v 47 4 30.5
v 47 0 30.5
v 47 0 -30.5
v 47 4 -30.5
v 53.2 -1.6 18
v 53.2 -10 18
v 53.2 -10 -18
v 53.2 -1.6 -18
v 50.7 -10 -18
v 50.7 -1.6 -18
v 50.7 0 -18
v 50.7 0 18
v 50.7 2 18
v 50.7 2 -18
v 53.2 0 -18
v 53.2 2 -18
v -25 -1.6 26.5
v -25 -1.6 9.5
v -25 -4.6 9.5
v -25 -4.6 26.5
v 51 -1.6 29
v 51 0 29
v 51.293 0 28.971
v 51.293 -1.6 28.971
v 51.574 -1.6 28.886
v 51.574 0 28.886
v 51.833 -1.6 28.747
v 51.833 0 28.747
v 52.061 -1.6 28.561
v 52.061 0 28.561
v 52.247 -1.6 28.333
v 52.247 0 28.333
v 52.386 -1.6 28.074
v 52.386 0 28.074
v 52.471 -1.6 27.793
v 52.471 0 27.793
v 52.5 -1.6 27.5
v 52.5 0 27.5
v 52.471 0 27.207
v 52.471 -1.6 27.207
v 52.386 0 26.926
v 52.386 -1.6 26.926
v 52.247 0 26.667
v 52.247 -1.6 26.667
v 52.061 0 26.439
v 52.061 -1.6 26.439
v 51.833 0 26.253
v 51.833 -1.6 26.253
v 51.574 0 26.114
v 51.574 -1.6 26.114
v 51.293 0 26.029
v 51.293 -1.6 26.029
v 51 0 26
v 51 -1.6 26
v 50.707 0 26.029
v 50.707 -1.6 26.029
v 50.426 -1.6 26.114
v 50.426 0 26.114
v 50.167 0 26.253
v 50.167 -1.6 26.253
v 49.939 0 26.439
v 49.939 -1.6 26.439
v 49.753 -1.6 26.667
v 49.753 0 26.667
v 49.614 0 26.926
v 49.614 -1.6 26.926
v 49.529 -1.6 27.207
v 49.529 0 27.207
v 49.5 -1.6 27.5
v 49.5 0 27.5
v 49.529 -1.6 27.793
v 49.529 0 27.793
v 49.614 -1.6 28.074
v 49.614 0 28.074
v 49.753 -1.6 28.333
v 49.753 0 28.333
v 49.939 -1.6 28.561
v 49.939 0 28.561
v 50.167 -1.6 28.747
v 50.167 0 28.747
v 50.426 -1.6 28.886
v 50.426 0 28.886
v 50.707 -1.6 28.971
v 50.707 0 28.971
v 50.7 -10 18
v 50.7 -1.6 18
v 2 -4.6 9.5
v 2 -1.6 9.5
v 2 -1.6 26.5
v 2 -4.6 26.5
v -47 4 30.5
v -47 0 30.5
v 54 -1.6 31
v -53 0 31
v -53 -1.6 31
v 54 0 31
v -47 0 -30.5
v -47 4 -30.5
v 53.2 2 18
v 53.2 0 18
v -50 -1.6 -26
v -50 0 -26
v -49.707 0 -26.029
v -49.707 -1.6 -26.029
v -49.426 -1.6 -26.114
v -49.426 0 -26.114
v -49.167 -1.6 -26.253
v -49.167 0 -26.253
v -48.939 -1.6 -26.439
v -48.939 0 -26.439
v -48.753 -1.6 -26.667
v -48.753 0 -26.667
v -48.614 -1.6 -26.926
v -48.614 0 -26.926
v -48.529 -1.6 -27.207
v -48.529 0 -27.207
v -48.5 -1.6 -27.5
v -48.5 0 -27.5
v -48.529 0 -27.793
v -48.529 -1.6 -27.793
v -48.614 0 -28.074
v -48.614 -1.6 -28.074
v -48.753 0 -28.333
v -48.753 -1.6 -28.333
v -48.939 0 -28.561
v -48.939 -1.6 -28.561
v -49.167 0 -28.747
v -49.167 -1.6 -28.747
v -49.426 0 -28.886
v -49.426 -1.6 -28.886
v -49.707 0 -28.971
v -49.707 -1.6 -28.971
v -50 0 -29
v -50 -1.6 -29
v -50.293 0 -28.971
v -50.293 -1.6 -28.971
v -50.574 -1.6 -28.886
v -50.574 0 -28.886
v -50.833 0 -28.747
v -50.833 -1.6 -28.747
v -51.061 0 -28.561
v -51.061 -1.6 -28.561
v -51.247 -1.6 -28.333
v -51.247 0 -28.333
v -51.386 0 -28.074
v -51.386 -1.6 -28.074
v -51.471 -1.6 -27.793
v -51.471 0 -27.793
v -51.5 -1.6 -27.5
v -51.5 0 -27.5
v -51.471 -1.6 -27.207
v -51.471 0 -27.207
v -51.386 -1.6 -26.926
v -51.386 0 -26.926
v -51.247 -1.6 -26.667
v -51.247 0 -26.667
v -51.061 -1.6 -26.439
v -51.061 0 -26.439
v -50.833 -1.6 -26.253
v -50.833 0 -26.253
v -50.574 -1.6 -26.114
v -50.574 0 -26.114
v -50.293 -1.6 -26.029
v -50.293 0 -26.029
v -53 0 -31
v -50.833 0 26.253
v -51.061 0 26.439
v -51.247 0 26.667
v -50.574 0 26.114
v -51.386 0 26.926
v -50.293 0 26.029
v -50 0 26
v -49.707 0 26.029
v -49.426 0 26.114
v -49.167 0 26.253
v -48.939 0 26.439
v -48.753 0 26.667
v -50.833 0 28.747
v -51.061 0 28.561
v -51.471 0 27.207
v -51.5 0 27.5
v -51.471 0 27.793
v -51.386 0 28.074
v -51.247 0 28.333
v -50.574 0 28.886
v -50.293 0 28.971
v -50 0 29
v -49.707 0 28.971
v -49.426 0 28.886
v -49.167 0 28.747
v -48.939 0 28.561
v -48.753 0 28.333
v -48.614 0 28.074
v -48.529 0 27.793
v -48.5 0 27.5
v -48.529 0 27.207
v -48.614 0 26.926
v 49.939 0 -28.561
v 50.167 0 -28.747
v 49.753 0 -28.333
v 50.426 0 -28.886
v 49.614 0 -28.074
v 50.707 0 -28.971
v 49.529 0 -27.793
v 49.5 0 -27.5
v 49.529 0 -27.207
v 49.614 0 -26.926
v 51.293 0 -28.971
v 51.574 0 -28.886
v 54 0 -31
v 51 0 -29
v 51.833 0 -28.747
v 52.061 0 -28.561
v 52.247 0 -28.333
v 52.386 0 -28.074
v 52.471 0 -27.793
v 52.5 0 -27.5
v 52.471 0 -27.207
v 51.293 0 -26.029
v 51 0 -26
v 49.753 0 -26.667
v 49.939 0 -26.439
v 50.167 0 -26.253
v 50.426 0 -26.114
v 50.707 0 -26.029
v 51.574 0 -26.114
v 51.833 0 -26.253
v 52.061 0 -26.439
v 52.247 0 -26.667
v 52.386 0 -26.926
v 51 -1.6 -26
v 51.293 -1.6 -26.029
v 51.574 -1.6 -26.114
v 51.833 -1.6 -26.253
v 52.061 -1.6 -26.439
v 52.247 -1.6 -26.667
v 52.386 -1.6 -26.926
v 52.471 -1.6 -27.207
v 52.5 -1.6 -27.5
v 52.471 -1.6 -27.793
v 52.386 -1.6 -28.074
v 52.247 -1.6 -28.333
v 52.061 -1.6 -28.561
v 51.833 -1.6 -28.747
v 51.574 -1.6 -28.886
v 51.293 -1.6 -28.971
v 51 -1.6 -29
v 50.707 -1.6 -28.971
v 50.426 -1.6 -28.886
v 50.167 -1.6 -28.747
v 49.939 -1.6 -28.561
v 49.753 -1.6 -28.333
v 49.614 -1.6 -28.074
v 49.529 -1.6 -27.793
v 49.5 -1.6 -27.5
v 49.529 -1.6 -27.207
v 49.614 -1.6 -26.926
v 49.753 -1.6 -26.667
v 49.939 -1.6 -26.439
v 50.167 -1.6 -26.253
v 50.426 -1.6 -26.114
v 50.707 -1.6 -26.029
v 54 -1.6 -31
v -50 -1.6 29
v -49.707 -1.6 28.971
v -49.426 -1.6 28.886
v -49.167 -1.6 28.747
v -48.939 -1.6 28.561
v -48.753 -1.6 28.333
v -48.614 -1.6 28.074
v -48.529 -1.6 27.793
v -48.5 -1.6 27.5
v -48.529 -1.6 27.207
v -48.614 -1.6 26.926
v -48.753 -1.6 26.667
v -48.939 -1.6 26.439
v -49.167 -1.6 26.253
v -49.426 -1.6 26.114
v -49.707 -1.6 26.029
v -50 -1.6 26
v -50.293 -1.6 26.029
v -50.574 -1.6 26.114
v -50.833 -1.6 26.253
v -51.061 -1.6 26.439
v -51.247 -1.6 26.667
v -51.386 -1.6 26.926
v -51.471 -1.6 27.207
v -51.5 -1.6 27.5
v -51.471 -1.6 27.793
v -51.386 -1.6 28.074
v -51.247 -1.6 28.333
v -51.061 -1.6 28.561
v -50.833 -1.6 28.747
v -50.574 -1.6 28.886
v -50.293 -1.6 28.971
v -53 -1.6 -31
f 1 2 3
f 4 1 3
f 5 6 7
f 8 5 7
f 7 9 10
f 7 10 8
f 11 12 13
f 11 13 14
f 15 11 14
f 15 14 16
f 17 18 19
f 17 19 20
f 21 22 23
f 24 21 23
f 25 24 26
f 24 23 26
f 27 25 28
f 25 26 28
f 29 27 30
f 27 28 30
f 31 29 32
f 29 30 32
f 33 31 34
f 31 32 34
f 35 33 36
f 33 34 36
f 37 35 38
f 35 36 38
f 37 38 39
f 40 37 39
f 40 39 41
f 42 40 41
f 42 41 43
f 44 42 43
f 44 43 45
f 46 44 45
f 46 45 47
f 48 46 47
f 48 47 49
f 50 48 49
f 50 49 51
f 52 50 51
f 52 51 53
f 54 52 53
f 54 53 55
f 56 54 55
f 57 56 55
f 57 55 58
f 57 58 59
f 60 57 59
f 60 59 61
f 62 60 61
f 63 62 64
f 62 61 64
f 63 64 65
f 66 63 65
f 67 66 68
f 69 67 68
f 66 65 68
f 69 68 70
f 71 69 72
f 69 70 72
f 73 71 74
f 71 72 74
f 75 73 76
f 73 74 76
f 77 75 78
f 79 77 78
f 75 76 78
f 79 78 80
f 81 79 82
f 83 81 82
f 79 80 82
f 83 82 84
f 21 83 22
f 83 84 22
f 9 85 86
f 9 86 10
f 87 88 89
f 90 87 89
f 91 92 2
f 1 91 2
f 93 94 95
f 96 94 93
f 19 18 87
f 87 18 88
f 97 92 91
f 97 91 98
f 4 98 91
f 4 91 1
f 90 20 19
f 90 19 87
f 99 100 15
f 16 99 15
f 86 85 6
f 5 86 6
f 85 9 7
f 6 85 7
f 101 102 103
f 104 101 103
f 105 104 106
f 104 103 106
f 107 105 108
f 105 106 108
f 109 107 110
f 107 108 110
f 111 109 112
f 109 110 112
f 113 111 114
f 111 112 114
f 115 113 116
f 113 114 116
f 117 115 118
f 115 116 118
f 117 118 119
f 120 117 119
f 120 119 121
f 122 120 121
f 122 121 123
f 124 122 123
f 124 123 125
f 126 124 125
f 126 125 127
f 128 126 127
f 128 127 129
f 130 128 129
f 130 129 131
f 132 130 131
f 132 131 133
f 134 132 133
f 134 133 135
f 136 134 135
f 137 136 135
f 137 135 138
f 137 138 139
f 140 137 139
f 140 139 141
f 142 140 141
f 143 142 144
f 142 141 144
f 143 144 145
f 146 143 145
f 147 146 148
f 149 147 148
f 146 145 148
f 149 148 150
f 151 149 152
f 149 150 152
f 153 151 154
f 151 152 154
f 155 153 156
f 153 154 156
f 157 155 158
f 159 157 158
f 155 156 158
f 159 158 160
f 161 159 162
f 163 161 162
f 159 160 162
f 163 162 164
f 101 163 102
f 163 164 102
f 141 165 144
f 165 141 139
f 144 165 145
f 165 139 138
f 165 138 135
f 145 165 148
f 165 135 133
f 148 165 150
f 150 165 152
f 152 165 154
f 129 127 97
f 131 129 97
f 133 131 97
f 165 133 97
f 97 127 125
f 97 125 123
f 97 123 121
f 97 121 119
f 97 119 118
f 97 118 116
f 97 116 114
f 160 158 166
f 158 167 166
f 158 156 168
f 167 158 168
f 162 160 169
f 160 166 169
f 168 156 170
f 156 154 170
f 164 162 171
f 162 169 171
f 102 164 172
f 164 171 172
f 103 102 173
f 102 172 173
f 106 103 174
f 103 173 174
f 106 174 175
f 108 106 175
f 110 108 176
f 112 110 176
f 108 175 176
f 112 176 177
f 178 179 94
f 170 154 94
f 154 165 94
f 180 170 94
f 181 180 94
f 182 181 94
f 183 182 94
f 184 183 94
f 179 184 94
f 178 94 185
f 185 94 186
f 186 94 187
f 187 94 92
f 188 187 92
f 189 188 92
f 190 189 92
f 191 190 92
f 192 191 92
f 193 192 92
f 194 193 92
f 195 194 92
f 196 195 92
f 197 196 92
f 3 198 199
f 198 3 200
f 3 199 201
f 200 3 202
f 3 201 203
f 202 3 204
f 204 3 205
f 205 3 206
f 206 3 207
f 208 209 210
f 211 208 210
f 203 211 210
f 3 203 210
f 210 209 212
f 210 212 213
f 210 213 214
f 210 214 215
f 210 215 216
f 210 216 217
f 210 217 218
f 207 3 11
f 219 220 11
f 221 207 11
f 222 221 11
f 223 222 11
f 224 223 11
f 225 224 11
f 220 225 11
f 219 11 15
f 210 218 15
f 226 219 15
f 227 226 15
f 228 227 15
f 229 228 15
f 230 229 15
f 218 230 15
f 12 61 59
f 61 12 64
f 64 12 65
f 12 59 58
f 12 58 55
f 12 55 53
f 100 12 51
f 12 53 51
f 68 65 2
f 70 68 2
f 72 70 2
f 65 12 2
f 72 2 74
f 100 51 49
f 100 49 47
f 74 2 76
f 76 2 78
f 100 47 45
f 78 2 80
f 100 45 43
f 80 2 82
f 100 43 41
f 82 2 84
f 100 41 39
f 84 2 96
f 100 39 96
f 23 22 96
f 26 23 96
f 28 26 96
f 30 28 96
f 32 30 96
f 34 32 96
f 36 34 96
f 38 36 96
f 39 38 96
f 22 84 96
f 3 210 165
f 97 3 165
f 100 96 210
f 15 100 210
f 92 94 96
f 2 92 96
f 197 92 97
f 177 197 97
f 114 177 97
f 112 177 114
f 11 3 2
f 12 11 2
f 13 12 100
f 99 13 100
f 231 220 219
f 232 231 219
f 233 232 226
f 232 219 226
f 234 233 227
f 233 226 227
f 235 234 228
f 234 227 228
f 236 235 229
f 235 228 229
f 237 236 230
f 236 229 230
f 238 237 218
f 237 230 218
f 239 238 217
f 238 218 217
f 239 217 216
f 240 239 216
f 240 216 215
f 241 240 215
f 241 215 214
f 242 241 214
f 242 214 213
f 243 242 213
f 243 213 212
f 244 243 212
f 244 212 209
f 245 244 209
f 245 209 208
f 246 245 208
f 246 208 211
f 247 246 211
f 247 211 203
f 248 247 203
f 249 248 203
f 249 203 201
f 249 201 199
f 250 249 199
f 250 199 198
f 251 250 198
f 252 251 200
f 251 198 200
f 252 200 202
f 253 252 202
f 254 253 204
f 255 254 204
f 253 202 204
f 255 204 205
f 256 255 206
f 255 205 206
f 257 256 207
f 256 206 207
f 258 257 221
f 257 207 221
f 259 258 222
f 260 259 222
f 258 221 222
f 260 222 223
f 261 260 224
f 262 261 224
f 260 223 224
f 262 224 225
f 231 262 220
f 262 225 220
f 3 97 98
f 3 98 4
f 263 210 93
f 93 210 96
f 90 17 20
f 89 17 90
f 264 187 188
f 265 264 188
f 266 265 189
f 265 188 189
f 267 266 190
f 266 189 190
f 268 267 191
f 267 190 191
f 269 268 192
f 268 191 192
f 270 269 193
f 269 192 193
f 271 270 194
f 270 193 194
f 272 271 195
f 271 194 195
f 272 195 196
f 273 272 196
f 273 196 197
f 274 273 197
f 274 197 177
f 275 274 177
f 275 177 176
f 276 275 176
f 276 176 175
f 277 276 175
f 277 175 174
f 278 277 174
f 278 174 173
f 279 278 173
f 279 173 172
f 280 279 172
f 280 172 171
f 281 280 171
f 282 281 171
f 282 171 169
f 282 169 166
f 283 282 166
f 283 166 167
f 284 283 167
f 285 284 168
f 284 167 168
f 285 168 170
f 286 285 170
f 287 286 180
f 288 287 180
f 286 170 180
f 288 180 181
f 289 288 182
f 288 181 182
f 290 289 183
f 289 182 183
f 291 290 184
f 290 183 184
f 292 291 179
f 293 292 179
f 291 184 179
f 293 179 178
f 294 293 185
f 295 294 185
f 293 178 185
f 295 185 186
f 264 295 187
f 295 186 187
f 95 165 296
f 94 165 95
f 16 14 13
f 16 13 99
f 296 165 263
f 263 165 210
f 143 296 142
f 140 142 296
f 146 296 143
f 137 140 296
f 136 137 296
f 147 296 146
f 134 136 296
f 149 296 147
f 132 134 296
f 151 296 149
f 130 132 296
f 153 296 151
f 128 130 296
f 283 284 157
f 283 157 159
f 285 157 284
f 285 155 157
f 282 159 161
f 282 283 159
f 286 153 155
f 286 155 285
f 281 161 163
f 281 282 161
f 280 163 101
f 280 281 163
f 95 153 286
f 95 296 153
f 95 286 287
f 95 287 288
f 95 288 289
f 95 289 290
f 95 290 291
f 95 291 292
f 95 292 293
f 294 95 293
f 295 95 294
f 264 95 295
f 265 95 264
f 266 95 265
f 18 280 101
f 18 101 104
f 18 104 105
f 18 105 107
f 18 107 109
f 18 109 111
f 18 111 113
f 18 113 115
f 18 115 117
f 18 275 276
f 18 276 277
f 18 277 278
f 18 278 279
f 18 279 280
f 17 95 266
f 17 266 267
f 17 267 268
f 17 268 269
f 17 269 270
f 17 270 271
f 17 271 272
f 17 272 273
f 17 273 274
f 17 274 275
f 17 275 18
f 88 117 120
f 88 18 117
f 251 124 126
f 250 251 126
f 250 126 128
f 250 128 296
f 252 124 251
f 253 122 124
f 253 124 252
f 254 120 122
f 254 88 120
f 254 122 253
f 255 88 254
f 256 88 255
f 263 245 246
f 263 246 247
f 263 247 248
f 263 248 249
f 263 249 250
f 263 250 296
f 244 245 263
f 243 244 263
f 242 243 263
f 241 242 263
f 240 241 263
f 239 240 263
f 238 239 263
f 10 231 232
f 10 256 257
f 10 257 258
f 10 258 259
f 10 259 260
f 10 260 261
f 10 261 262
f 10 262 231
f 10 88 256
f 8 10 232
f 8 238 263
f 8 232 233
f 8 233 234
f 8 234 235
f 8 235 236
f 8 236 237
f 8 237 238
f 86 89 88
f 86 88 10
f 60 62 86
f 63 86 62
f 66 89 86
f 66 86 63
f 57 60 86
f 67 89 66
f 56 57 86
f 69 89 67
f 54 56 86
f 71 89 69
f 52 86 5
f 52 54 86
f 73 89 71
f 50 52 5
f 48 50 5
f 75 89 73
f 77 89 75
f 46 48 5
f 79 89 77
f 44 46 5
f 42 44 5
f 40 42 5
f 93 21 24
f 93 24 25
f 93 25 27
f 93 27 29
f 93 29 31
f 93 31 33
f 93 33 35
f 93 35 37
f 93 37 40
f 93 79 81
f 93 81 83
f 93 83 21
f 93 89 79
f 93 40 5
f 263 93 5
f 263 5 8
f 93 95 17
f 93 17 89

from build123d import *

# Parameters (mm, degrees)
SCHIZZO1_W                        = 94
SCHIZZO1_H                        = 61
ESTRUSIONE_ESTRUSIONE1_DEPTH      = 4
SCHIZZO2_W                        = 107
SCHIZZO2_H                        = 62
ESTRUSIONE_ESTRUSIONE2_DEPTH      = 1.6
ESTRUSIONE_ESTRUSIONE3_DEPTH      = 2
ESTRUSIONE_ESTRUSIONE3_DEPTH_BACK = 10
SCHIZZO4_W                        = 2.5
SCHIZZO4_H                        = 36
SCHIZZO6_R                        = 1.5
TAGLIO_ESTRUSIONE1_DEPTH          = 2
SCHIZZO7_W                        = 27
SCHIZZO7_H                        = 17
ESTRUSIONE_ESTRUSIONE4_DEPTH      = 3


with BuildPart() as part:
    # Schizzo1 → Estrusione-Estrusione1 (new body)
    with BuildSketch(Plane(origin=(0, 0, 0), x_dir=(1, 0, 0), z_dir=(0, 1, 0))):
        Rectangle(SCHIZZO1_W, SCHIZZO1_H)
    extrude(amount=ESTRUSIONE_ESTRUSIONE1_DEPTH)

    # Schizzo2 → Estrusione-Estrusione2 (add)
    with BuildSketch(Plane.XZ):
        with Locations((0.5, 0)):
            Rectangle(SCHIZZO2_W, SCHIZZO2_H)
    extrude(amount=ESTRUSIONE_ESTRUSIONE2_DEPTH)

    # Schizzo4 → Estrusione-Estrusione3 (add, two sides: drawn at the far end of the back side and taken through both)
    with BuildSketch(Plane(origin=(0, 0, 0), x_dir=(1, 0, 0), z_dir=(0, 1, 0)).offset(-ESTRUSIONE_ESTRUSIONE3_DEPTH_BACK)):
        with Locations((51.95, 0)):
            Rectangle(SCHIZZO4_W, SCHIZZO4_H)
    extrude(amount=ESTRUSIONE_ESTRUSIONE3_DEPTH + ESTRUSIONE_ESTRUSIONE3_DEPTH_BACK)

    # Schizzo6 → Taglio-Estrusione1 (cut)
    with BuildSketch(Plane(origin=(0, 0, 0), x_dir=(1, 0, 0), z_dir=(0, 1, 0))):
        with Locations(Location((-50, 27.5, 0), (0, 0, 270))):
            Circle(SCHIZZO6_R)
        with Locations(Location((-50, -27.5, 0), (0, 0, 270))):
            Circle(SCHIZZO6_R)
        with Locations(Location((51, 27.5, 0), (0, 0, 270))):
            Circle(SCHIZZO6_R)
        with Locations(Location((51, -27.5, 0), (0, 0, 270))):
            Circle(SCHIZZO6_R)
    extrude(amount=-TAGLIO_ESTRUSIONE1_DEPTH, mode=Mode.SUBTRACT)

    # Schizzo7 → Estrusione-Estrusione4 (add)
    with BuildSketch(Plane.XZ.offset(1.6)):
        with Locations((-11.5, 18)):
            Rectangle(SCHIZZO7_W, SCHIZZO7_H)
    extrude(amount=ESTRUSIONE_ESTRUSIONE4_DEPTH)


solid = part.part
